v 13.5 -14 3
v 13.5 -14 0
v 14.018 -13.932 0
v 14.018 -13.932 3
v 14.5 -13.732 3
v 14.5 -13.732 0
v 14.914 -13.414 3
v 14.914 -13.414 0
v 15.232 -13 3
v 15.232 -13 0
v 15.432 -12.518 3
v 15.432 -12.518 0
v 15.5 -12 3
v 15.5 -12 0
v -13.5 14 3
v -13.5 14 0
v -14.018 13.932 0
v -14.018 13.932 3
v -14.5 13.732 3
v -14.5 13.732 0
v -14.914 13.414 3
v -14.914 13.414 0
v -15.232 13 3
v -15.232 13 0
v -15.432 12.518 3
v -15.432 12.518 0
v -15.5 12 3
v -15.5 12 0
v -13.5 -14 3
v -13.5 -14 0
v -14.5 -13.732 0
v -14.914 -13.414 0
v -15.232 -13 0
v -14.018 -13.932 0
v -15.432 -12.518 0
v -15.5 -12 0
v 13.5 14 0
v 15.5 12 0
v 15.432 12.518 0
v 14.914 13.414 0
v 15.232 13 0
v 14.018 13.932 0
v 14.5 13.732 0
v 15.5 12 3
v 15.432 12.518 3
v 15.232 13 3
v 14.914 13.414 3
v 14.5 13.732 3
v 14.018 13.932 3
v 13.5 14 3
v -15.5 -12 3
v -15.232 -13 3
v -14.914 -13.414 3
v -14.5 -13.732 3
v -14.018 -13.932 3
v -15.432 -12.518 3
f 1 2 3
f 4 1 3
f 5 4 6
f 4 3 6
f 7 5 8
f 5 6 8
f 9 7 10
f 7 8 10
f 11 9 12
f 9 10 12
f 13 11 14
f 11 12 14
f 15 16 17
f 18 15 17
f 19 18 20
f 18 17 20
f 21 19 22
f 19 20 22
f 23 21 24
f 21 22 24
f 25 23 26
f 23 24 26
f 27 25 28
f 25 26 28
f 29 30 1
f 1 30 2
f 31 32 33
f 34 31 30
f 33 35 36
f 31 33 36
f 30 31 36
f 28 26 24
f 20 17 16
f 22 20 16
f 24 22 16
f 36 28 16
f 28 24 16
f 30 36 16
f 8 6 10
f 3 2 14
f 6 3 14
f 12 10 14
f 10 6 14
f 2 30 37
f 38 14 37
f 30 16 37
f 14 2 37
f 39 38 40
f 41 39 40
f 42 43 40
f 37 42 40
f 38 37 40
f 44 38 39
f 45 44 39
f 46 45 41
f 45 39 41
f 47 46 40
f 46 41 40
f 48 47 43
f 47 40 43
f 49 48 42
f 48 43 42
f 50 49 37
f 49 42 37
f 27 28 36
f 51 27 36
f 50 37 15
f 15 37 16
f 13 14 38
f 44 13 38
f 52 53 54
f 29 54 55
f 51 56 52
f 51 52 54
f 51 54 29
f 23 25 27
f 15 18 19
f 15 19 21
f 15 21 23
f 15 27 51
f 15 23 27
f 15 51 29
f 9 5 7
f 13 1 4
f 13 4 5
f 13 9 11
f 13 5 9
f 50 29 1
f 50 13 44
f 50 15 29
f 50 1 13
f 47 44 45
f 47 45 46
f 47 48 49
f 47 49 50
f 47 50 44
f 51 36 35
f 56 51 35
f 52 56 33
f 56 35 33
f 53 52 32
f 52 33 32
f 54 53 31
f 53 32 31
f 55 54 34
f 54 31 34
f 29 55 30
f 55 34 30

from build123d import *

# Parameters (mm, degrees)
F0_W     = 25
F0_H     = 21
F0_W_2   = 3
F0_H_2   = 6
F0_R     = 3
F0_R_2   = 2.65
F1_DEPTH = 3


with BuildPart() as f1:
    # F0 (on Top) → F1 (new body)
    with BuildSketch(Plane.XY):
        with BuildLine():
            ThreePointArc((15.5, 12), (14.9142135624, 13.4142135624), (13.5, 14))
            Line((13.5, 14), (-13.5, 14))
            ThreePointArc((-13.5, 14), (-14.9142135624, 13.4142135624), (-15.5, 12))
            Line((-15.5, 12), (-15.5, -12))
            ThreePointArc((-15.5, -12), (-14.9142135624, -13.4142135624), (-13.5, -14))
            Line((-13.5, -14), (13.5, -14))
            ThreePointArc((13.5, -14), (14.9142135624, -13.4142135624), (15.5, -12))
            Line((15.5, -12), (15.5, 12))
        make_face()
        Rectangle(F0_W, F0_H, mode=Mode.SUBTRACT)
        Rectangle(F0_W, F0_H)
        with Locations((-7.5, -2.7)):
            Rectangle(F0_W_2, F0_H_2, mode=Mode.SUBTRACT)
        with Locations((7.5, -2.7)):
            Rectangle(F0_W_2, F0_H_2, mode=Mode.SUBTRACT)
        with Locations((-7.5, 5.2)):
            Circle(F0_R, mode=Mode.SUBTRACT)
        with Locations((7.5, 5.2)):
            Circle(F0_R, mode=Mode.SUBTRACT)
        with Locations((7.5, 5.2)):
            Circle(F0_R)
        with Locations((7.5, 5.2)):
            Circle(F0_R_2, mode=Mode.SUBTRACT)
        with Locations((-7.5, 5.2)):
            Circle(F0_R)
        with Locations((-7.5, 5.2)):
            Circle(F0_R_2, mode=Mode.SUBTRACT)
        with Locations((7.5, 5.2)):
            Circle(F0_R_2)
        with Locations((-7.5, 5.2)):
            Circle(F0_R_2)
        with Locations((7.5, -2.7)):
            Rectangle(F0_W_2, F0_H_2)
        with Locations((-7.5, -2.7)):
            Rectangle(F0_W_2, F0_H_2)
    extrude(amount=F1_DEPTH)


solid = f1.part
